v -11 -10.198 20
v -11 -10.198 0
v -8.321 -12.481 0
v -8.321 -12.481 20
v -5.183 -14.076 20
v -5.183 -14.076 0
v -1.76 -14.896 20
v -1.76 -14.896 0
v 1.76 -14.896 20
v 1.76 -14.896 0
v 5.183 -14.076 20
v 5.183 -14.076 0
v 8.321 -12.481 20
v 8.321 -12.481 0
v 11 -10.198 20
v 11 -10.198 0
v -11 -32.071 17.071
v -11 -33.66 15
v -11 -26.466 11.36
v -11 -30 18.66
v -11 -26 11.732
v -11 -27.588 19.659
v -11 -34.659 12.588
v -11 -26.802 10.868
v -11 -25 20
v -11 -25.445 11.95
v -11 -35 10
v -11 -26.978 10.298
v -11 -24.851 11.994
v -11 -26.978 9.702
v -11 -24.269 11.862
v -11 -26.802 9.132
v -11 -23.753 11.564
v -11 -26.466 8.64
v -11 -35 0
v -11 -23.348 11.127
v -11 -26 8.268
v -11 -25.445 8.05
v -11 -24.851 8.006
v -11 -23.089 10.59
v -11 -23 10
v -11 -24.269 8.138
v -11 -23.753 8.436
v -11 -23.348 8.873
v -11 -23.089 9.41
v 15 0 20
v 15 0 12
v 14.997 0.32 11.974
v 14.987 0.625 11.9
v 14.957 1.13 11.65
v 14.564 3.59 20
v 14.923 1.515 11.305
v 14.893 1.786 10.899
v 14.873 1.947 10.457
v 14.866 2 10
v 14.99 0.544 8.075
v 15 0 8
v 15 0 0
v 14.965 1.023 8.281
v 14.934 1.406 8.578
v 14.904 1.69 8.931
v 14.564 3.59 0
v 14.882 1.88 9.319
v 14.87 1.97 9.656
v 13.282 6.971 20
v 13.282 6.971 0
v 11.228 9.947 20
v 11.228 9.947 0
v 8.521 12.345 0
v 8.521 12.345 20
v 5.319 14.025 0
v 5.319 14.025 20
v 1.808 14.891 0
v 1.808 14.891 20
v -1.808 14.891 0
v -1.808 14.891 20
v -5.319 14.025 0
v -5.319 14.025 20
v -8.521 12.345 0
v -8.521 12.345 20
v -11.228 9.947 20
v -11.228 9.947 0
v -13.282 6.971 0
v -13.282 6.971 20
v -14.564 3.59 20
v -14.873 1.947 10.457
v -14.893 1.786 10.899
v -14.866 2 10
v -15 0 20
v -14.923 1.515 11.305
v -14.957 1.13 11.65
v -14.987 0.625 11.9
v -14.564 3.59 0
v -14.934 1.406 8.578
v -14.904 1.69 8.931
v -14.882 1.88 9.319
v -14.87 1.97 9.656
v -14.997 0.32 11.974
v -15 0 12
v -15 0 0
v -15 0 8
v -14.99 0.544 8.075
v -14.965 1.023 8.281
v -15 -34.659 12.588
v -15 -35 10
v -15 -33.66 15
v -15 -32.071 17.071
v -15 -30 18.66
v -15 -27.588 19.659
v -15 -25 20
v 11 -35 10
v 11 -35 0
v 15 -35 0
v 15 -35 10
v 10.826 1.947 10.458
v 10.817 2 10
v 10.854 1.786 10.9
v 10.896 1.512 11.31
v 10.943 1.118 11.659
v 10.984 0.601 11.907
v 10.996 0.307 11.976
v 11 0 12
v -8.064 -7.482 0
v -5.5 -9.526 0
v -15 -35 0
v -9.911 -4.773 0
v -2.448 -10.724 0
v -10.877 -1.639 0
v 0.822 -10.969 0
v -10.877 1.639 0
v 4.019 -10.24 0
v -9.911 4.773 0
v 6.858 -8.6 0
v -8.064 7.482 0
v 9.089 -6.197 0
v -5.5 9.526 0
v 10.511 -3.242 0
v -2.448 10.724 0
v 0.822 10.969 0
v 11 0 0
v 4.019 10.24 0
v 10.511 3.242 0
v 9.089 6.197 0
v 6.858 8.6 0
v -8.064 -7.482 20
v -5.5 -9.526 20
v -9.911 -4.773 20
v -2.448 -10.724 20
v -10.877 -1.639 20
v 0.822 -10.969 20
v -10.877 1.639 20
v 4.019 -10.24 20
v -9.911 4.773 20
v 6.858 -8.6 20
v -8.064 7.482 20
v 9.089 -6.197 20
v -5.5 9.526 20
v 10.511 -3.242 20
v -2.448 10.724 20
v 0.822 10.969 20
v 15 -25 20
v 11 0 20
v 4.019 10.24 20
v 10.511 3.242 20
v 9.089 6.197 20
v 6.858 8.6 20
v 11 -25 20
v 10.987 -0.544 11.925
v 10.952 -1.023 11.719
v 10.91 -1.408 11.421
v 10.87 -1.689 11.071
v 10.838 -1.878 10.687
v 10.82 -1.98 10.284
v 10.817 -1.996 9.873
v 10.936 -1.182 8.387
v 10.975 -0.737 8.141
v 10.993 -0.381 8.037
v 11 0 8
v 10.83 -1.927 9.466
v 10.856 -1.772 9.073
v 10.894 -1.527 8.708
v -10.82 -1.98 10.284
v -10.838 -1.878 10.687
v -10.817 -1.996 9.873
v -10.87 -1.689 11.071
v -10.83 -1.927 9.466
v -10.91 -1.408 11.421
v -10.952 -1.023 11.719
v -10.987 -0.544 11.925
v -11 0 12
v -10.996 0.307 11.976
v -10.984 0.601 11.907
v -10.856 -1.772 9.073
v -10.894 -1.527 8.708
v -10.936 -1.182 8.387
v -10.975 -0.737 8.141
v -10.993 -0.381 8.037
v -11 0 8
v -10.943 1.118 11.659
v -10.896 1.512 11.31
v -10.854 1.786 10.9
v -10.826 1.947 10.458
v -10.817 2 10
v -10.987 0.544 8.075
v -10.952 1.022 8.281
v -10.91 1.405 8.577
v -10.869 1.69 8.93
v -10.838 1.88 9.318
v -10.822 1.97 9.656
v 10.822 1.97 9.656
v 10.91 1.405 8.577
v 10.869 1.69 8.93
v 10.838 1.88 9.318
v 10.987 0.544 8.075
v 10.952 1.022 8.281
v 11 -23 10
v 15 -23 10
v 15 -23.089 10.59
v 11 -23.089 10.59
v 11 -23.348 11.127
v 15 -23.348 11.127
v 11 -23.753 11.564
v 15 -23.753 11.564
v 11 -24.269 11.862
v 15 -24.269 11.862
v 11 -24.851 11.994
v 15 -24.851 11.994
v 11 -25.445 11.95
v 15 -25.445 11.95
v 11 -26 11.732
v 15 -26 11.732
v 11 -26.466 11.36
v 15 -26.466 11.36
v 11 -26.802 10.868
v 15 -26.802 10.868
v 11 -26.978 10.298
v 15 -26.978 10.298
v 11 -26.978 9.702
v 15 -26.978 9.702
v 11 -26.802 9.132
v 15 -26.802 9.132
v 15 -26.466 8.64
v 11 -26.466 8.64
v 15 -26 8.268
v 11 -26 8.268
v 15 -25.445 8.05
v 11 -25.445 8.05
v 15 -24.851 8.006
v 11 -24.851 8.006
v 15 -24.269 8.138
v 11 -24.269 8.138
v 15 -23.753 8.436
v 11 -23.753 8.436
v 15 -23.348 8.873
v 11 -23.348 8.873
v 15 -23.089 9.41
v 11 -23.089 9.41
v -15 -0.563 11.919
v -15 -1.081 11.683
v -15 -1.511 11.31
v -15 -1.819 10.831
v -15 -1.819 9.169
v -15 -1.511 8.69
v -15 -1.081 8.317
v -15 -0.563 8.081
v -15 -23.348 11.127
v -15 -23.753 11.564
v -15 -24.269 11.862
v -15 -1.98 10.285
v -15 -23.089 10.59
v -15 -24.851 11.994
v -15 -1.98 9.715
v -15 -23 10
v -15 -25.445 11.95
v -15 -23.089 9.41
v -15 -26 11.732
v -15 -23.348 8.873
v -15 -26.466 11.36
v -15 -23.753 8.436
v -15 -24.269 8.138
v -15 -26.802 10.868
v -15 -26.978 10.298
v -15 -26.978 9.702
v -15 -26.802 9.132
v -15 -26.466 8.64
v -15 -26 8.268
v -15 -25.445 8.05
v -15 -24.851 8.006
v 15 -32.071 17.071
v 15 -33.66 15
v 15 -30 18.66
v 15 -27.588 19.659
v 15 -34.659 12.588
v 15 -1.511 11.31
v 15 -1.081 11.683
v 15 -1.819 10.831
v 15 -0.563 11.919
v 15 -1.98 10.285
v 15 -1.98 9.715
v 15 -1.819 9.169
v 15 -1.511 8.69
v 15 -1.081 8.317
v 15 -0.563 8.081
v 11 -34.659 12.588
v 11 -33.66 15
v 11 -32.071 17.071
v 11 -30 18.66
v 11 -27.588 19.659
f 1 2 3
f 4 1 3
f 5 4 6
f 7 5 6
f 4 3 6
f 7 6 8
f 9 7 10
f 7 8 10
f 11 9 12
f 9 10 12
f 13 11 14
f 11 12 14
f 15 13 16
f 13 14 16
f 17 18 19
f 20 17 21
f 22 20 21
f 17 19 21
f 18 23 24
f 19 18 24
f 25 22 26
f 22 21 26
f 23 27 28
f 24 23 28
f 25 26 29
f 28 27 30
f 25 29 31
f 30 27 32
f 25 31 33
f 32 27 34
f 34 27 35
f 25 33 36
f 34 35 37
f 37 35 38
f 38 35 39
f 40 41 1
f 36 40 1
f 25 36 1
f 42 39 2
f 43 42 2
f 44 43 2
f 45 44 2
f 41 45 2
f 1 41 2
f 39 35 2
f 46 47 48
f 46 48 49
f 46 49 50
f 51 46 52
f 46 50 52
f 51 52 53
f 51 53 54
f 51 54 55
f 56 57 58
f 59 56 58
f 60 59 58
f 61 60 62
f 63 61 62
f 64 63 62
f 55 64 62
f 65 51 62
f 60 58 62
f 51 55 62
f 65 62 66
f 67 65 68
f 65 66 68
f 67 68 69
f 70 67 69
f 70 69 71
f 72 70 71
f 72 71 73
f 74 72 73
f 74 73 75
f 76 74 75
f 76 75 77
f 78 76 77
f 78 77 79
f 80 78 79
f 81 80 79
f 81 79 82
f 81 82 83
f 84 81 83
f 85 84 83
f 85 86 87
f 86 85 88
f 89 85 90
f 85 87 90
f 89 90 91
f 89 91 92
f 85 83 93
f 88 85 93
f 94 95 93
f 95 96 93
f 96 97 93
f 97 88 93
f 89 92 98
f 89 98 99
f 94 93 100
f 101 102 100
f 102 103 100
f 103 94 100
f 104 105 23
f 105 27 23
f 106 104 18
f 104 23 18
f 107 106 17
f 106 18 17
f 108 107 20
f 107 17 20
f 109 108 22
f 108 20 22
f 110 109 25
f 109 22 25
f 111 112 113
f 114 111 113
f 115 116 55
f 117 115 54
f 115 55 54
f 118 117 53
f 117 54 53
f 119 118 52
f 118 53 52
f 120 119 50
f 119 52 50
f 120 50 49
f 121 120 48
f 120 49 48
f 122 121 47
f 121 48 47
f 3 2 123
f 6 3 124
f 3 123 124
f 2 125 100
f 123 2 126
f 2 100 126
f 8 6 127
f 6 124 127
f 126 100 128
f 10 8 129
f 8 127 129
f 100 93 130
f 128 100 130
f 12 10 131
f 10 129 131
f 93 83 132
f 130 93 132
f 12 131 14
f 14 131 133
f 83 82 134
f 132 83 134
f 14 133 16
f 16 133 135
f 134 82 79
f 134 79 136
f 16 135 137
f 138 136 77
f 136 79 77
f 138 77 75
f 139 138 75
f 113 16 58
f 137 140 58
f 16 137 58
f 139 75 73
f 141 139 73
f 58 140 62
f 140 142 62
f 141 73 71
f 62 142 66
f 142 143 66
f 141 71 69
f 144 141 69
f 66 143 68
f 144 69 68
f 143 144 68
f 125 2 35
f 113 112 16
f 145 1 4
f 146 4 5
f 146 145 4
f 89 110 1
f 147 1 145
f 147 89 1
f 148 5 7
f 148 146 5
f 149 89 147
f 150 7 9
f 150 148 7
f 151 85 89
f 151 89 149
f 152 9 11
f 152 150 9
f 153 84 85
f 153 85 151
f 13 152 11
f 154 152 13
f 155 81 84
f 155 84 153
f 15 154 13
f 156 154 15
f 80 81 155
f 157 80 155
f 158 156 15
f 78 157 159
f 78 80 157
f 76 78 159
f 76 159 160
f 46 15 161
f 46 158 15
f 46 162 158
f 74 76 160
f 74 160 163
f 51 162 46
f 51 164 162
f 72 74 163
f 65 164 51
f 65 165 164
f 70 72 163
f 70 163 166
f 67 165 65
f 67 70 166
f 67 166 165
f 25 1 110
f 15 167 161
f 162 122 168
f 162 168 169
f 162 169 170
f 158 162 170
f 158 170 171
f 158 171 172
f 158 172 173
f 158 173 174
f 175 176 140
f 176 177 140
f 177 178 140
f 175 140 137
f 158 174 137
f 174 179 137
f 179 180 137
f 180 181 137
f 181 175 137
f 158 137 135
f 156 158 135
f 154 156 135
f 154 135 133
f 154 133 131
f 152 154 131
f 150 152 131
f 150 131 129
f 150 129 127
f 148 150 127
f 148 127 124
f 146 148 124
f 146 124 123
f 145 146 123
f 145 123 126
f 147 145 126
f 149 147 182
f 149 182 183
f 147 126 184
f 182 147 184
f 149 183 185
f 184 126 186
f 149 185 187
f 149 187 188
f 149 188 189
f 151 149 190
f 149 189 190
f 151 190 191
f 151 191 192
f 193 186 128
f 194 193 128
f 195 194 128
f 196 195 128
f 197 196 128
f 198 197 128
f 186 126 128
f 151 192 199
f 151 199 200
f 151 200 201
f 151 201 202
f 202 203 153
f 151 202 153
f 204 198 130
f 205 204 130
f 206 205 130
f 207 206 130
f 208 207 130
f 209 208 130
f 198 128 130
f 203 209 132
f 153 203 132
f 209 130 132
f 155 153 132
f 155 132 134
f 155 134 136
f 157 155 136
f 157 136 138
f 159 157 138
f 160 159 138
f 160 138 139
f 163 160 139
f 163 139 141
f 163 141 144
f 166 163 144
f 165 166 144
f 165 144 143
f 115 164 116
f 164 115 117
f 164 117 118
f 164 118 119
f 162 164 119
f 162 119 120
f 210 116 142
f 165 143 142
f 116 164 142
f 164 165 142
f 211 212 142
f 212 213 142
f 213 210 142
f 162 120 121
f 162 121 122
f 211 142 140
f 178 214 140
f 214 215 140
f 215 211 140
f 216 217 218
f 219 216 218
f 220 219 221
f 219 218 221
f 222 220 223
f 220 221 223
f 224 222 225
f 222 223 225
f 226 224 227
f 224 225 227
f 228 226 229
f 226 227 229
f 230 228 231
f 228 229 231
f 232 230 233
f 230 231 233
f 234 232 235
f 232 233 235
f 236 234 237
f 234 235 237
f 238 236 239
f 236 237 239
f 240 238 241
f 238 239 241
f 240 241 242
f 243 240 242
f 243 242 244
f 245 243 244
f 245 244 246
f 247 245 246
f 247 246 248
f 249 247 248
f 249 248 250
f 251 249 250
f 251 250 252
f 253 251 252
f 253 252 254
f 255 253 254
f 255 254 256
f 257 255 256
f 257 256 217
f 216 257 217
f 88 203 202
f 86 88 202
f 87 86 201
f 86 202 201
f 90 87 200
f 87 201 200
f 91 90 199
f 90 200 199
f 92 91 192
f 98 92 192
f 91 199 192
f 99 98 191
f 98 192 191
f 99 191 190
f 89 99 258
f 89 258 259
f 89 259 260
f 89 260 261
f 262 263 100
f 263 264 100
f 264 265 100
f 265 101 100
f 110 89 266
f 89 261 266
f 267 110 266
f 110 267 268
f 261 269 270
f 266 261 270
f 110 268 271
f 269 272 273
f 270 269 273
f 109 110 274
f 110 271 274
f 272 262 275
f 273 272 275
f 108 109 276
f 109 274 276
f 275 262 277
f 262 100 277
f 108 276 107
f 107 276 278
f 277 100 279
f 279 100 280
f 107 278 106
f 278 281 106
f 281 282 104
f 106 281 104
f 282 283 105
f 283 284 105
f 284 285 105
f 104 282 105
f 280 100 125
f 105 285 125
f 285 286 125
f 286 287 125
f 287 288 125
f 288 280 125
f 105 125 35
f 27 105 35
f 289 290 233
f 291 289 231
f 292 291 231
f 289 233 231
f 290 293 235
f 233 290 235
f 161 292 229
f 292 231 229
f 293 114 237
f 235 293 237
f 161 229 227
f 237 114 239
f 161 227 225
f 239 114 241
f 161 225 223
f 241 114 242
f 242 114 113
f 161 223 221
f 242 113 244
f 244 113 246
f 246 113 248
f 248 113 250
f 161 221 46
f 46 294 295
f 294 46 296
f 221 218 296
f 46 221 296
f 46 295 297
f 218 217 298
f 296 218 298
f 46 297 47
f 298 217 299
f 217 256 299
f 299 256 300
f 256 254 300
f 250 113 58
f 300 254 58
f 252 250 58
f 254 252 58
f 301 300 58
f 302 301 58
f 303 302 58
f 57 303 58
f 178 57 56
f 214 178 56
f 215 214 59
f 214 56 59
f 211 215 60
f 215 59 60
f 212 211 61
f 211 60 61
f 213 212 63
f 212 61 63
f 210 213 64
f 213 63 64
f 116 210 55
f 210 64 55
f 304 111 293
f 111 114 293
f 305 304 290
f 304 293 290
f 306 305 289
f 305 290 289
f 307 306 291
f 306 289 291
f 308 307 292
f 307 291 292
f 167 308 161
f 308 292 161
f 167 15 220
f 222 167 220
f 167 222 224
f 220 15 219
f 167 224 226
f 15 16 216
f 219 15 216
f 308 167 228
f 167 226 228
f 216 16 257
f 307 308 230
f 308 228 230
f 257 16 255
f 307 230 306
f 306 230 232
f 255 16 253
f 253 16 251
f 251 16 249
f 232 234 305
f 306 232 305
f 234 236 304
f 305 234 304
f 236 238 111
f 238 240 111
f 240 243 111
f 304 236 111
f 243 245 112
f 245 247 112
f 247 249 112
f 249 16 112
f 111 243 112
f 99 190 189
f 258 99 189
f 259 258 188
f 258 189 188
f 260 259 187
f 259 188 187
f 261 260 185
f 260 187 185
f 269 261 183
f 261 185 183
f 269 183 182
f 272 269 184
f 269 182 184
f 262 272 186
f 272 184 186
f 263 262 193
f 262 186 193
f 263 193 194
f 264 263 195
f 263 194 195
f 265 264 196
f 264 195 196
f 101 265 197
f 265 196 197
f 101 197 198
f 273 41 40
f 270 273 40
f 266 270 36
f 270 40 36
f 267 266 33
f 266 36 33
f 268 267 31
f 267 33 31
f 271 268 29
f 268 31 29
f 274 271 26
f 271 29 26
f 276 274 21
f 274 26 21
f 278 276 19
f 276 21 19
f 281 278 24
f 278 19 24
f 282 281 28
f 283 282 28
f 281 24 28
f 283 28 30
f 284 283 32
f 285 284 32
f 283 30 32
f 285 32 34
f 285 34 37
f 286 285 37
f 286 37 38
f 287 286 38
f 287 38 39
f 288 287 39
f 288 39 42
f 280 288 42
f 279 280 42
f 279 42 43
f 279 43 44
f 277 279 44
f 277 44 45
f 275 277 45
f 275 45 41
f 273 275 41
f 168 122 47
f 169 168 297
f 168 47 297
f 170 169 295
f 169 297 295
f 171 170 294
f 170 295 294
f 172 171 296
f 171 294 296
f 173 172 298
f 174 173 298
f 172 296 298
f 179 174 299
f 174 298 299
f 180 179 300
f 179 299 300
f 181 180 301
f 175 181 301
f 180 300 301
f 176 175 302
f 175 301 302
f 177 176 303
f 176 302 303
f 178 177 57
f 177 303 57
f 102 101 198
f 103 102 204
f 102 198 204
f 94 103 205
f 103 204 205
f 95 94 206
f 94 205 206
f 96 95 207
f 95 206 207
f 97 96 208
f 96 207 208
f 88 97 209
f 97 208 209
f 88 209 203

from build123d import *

# Parameters (mm, degrees)
F1_DEPTH = 20
F2_R     = 10
F3_R     = 2
F4_DEPTH = 30


with BuildPart() as f1:
    # F0 (on Top) → F1 (new body)
    with BuildSketch(Plane.XY):
        with BuildLine():
            ThreePointArc((-11, 0), (0, 11), (11, 0))
            Line((11, 0), (15, 0))
            ThreePointArc((15, 0), (0, 15), (-15, 0))
            Line((-15, 0), (-11, 0))
        make_face()
        with BuildLine():
            Line((15, 0), (11, 0))
            Line((11, 0), (11, -10.1980390272))
            ThreePointArc((11, -10.1980390272), (13.9642400438, -5.4772255751), (15, 0))
        make_face()
        with BuildLine():
            Line((-11, -10.1980390272), (-11, 0))
            Line((-11, 0), (-15, 0))
            ThreePointArc((-15, 0), (-13.9642400438, -5.4772255751), (-11, -10.1980390272))
        make_face()
        with BuildLine():
            Line((11, -10.1980390272), (11, 0))
            ThreePointArc((11, 0), (0, -11), (-11, 0))
            Line((-11, 0), (-11, -10.1980390272))
            ThreePointArc((-11, -10.1980390272), (0, -15), (11, -10.1980390272))
        make_face()
        with BuildLine():
            ThreePointArc((-11, -10.1980390272), (-13.9642400438, -5.4772255751), (-15, 0))
            Line((-15, 0), (-15, -35))
            Line((-15, -35), (-11, -35))
            Line((-11, -35), (-11, -10.1980390272))
        make_face()
        with BuildLine():
            Line((15, -35), (15, 0))
            ThreePointArc((15, 0), (13.9642400438, -5.4772255751), (11, -10.1980390272))
            Line((11, -10.1980390272), (11, -35))
            Line((11, -35), (15, -35))
        make_face()
    extrude(amount=F1_DEPTH)

    # F2
    f2_edges = [f1.edges().sort_by_distance(p)[0] for p in [
        (-13, -35, 20),
        (13, -35, 20),
    ]]
    fillet(f2_edges, radius=F2_R)

    # F3 (on face) → F4 (cut)
    with BuildSketch(Plane.YZ.offset(15)):
        with Locations((-25, 10)):
            Circle(F3_R)
        with BuildLine():
            ThreePointArc((0, 8), (1.4142135624, 8.5857864376), (2, 10))
            ThreePointArc((2, 10), (1.4142135624, 11.4142135624), (0, 12))
            Line((0, 12), (0, 8))
        make_face()
        with BuildLine():
            Line((0, 8), (0, 12))
            ThreePointArc((0, 12), (-2, 10), (0, 8))
        make_face()
    extrude(amount=-F4_DEPTH, mode=Mode.SUBTRACT)


solid = f1.part
